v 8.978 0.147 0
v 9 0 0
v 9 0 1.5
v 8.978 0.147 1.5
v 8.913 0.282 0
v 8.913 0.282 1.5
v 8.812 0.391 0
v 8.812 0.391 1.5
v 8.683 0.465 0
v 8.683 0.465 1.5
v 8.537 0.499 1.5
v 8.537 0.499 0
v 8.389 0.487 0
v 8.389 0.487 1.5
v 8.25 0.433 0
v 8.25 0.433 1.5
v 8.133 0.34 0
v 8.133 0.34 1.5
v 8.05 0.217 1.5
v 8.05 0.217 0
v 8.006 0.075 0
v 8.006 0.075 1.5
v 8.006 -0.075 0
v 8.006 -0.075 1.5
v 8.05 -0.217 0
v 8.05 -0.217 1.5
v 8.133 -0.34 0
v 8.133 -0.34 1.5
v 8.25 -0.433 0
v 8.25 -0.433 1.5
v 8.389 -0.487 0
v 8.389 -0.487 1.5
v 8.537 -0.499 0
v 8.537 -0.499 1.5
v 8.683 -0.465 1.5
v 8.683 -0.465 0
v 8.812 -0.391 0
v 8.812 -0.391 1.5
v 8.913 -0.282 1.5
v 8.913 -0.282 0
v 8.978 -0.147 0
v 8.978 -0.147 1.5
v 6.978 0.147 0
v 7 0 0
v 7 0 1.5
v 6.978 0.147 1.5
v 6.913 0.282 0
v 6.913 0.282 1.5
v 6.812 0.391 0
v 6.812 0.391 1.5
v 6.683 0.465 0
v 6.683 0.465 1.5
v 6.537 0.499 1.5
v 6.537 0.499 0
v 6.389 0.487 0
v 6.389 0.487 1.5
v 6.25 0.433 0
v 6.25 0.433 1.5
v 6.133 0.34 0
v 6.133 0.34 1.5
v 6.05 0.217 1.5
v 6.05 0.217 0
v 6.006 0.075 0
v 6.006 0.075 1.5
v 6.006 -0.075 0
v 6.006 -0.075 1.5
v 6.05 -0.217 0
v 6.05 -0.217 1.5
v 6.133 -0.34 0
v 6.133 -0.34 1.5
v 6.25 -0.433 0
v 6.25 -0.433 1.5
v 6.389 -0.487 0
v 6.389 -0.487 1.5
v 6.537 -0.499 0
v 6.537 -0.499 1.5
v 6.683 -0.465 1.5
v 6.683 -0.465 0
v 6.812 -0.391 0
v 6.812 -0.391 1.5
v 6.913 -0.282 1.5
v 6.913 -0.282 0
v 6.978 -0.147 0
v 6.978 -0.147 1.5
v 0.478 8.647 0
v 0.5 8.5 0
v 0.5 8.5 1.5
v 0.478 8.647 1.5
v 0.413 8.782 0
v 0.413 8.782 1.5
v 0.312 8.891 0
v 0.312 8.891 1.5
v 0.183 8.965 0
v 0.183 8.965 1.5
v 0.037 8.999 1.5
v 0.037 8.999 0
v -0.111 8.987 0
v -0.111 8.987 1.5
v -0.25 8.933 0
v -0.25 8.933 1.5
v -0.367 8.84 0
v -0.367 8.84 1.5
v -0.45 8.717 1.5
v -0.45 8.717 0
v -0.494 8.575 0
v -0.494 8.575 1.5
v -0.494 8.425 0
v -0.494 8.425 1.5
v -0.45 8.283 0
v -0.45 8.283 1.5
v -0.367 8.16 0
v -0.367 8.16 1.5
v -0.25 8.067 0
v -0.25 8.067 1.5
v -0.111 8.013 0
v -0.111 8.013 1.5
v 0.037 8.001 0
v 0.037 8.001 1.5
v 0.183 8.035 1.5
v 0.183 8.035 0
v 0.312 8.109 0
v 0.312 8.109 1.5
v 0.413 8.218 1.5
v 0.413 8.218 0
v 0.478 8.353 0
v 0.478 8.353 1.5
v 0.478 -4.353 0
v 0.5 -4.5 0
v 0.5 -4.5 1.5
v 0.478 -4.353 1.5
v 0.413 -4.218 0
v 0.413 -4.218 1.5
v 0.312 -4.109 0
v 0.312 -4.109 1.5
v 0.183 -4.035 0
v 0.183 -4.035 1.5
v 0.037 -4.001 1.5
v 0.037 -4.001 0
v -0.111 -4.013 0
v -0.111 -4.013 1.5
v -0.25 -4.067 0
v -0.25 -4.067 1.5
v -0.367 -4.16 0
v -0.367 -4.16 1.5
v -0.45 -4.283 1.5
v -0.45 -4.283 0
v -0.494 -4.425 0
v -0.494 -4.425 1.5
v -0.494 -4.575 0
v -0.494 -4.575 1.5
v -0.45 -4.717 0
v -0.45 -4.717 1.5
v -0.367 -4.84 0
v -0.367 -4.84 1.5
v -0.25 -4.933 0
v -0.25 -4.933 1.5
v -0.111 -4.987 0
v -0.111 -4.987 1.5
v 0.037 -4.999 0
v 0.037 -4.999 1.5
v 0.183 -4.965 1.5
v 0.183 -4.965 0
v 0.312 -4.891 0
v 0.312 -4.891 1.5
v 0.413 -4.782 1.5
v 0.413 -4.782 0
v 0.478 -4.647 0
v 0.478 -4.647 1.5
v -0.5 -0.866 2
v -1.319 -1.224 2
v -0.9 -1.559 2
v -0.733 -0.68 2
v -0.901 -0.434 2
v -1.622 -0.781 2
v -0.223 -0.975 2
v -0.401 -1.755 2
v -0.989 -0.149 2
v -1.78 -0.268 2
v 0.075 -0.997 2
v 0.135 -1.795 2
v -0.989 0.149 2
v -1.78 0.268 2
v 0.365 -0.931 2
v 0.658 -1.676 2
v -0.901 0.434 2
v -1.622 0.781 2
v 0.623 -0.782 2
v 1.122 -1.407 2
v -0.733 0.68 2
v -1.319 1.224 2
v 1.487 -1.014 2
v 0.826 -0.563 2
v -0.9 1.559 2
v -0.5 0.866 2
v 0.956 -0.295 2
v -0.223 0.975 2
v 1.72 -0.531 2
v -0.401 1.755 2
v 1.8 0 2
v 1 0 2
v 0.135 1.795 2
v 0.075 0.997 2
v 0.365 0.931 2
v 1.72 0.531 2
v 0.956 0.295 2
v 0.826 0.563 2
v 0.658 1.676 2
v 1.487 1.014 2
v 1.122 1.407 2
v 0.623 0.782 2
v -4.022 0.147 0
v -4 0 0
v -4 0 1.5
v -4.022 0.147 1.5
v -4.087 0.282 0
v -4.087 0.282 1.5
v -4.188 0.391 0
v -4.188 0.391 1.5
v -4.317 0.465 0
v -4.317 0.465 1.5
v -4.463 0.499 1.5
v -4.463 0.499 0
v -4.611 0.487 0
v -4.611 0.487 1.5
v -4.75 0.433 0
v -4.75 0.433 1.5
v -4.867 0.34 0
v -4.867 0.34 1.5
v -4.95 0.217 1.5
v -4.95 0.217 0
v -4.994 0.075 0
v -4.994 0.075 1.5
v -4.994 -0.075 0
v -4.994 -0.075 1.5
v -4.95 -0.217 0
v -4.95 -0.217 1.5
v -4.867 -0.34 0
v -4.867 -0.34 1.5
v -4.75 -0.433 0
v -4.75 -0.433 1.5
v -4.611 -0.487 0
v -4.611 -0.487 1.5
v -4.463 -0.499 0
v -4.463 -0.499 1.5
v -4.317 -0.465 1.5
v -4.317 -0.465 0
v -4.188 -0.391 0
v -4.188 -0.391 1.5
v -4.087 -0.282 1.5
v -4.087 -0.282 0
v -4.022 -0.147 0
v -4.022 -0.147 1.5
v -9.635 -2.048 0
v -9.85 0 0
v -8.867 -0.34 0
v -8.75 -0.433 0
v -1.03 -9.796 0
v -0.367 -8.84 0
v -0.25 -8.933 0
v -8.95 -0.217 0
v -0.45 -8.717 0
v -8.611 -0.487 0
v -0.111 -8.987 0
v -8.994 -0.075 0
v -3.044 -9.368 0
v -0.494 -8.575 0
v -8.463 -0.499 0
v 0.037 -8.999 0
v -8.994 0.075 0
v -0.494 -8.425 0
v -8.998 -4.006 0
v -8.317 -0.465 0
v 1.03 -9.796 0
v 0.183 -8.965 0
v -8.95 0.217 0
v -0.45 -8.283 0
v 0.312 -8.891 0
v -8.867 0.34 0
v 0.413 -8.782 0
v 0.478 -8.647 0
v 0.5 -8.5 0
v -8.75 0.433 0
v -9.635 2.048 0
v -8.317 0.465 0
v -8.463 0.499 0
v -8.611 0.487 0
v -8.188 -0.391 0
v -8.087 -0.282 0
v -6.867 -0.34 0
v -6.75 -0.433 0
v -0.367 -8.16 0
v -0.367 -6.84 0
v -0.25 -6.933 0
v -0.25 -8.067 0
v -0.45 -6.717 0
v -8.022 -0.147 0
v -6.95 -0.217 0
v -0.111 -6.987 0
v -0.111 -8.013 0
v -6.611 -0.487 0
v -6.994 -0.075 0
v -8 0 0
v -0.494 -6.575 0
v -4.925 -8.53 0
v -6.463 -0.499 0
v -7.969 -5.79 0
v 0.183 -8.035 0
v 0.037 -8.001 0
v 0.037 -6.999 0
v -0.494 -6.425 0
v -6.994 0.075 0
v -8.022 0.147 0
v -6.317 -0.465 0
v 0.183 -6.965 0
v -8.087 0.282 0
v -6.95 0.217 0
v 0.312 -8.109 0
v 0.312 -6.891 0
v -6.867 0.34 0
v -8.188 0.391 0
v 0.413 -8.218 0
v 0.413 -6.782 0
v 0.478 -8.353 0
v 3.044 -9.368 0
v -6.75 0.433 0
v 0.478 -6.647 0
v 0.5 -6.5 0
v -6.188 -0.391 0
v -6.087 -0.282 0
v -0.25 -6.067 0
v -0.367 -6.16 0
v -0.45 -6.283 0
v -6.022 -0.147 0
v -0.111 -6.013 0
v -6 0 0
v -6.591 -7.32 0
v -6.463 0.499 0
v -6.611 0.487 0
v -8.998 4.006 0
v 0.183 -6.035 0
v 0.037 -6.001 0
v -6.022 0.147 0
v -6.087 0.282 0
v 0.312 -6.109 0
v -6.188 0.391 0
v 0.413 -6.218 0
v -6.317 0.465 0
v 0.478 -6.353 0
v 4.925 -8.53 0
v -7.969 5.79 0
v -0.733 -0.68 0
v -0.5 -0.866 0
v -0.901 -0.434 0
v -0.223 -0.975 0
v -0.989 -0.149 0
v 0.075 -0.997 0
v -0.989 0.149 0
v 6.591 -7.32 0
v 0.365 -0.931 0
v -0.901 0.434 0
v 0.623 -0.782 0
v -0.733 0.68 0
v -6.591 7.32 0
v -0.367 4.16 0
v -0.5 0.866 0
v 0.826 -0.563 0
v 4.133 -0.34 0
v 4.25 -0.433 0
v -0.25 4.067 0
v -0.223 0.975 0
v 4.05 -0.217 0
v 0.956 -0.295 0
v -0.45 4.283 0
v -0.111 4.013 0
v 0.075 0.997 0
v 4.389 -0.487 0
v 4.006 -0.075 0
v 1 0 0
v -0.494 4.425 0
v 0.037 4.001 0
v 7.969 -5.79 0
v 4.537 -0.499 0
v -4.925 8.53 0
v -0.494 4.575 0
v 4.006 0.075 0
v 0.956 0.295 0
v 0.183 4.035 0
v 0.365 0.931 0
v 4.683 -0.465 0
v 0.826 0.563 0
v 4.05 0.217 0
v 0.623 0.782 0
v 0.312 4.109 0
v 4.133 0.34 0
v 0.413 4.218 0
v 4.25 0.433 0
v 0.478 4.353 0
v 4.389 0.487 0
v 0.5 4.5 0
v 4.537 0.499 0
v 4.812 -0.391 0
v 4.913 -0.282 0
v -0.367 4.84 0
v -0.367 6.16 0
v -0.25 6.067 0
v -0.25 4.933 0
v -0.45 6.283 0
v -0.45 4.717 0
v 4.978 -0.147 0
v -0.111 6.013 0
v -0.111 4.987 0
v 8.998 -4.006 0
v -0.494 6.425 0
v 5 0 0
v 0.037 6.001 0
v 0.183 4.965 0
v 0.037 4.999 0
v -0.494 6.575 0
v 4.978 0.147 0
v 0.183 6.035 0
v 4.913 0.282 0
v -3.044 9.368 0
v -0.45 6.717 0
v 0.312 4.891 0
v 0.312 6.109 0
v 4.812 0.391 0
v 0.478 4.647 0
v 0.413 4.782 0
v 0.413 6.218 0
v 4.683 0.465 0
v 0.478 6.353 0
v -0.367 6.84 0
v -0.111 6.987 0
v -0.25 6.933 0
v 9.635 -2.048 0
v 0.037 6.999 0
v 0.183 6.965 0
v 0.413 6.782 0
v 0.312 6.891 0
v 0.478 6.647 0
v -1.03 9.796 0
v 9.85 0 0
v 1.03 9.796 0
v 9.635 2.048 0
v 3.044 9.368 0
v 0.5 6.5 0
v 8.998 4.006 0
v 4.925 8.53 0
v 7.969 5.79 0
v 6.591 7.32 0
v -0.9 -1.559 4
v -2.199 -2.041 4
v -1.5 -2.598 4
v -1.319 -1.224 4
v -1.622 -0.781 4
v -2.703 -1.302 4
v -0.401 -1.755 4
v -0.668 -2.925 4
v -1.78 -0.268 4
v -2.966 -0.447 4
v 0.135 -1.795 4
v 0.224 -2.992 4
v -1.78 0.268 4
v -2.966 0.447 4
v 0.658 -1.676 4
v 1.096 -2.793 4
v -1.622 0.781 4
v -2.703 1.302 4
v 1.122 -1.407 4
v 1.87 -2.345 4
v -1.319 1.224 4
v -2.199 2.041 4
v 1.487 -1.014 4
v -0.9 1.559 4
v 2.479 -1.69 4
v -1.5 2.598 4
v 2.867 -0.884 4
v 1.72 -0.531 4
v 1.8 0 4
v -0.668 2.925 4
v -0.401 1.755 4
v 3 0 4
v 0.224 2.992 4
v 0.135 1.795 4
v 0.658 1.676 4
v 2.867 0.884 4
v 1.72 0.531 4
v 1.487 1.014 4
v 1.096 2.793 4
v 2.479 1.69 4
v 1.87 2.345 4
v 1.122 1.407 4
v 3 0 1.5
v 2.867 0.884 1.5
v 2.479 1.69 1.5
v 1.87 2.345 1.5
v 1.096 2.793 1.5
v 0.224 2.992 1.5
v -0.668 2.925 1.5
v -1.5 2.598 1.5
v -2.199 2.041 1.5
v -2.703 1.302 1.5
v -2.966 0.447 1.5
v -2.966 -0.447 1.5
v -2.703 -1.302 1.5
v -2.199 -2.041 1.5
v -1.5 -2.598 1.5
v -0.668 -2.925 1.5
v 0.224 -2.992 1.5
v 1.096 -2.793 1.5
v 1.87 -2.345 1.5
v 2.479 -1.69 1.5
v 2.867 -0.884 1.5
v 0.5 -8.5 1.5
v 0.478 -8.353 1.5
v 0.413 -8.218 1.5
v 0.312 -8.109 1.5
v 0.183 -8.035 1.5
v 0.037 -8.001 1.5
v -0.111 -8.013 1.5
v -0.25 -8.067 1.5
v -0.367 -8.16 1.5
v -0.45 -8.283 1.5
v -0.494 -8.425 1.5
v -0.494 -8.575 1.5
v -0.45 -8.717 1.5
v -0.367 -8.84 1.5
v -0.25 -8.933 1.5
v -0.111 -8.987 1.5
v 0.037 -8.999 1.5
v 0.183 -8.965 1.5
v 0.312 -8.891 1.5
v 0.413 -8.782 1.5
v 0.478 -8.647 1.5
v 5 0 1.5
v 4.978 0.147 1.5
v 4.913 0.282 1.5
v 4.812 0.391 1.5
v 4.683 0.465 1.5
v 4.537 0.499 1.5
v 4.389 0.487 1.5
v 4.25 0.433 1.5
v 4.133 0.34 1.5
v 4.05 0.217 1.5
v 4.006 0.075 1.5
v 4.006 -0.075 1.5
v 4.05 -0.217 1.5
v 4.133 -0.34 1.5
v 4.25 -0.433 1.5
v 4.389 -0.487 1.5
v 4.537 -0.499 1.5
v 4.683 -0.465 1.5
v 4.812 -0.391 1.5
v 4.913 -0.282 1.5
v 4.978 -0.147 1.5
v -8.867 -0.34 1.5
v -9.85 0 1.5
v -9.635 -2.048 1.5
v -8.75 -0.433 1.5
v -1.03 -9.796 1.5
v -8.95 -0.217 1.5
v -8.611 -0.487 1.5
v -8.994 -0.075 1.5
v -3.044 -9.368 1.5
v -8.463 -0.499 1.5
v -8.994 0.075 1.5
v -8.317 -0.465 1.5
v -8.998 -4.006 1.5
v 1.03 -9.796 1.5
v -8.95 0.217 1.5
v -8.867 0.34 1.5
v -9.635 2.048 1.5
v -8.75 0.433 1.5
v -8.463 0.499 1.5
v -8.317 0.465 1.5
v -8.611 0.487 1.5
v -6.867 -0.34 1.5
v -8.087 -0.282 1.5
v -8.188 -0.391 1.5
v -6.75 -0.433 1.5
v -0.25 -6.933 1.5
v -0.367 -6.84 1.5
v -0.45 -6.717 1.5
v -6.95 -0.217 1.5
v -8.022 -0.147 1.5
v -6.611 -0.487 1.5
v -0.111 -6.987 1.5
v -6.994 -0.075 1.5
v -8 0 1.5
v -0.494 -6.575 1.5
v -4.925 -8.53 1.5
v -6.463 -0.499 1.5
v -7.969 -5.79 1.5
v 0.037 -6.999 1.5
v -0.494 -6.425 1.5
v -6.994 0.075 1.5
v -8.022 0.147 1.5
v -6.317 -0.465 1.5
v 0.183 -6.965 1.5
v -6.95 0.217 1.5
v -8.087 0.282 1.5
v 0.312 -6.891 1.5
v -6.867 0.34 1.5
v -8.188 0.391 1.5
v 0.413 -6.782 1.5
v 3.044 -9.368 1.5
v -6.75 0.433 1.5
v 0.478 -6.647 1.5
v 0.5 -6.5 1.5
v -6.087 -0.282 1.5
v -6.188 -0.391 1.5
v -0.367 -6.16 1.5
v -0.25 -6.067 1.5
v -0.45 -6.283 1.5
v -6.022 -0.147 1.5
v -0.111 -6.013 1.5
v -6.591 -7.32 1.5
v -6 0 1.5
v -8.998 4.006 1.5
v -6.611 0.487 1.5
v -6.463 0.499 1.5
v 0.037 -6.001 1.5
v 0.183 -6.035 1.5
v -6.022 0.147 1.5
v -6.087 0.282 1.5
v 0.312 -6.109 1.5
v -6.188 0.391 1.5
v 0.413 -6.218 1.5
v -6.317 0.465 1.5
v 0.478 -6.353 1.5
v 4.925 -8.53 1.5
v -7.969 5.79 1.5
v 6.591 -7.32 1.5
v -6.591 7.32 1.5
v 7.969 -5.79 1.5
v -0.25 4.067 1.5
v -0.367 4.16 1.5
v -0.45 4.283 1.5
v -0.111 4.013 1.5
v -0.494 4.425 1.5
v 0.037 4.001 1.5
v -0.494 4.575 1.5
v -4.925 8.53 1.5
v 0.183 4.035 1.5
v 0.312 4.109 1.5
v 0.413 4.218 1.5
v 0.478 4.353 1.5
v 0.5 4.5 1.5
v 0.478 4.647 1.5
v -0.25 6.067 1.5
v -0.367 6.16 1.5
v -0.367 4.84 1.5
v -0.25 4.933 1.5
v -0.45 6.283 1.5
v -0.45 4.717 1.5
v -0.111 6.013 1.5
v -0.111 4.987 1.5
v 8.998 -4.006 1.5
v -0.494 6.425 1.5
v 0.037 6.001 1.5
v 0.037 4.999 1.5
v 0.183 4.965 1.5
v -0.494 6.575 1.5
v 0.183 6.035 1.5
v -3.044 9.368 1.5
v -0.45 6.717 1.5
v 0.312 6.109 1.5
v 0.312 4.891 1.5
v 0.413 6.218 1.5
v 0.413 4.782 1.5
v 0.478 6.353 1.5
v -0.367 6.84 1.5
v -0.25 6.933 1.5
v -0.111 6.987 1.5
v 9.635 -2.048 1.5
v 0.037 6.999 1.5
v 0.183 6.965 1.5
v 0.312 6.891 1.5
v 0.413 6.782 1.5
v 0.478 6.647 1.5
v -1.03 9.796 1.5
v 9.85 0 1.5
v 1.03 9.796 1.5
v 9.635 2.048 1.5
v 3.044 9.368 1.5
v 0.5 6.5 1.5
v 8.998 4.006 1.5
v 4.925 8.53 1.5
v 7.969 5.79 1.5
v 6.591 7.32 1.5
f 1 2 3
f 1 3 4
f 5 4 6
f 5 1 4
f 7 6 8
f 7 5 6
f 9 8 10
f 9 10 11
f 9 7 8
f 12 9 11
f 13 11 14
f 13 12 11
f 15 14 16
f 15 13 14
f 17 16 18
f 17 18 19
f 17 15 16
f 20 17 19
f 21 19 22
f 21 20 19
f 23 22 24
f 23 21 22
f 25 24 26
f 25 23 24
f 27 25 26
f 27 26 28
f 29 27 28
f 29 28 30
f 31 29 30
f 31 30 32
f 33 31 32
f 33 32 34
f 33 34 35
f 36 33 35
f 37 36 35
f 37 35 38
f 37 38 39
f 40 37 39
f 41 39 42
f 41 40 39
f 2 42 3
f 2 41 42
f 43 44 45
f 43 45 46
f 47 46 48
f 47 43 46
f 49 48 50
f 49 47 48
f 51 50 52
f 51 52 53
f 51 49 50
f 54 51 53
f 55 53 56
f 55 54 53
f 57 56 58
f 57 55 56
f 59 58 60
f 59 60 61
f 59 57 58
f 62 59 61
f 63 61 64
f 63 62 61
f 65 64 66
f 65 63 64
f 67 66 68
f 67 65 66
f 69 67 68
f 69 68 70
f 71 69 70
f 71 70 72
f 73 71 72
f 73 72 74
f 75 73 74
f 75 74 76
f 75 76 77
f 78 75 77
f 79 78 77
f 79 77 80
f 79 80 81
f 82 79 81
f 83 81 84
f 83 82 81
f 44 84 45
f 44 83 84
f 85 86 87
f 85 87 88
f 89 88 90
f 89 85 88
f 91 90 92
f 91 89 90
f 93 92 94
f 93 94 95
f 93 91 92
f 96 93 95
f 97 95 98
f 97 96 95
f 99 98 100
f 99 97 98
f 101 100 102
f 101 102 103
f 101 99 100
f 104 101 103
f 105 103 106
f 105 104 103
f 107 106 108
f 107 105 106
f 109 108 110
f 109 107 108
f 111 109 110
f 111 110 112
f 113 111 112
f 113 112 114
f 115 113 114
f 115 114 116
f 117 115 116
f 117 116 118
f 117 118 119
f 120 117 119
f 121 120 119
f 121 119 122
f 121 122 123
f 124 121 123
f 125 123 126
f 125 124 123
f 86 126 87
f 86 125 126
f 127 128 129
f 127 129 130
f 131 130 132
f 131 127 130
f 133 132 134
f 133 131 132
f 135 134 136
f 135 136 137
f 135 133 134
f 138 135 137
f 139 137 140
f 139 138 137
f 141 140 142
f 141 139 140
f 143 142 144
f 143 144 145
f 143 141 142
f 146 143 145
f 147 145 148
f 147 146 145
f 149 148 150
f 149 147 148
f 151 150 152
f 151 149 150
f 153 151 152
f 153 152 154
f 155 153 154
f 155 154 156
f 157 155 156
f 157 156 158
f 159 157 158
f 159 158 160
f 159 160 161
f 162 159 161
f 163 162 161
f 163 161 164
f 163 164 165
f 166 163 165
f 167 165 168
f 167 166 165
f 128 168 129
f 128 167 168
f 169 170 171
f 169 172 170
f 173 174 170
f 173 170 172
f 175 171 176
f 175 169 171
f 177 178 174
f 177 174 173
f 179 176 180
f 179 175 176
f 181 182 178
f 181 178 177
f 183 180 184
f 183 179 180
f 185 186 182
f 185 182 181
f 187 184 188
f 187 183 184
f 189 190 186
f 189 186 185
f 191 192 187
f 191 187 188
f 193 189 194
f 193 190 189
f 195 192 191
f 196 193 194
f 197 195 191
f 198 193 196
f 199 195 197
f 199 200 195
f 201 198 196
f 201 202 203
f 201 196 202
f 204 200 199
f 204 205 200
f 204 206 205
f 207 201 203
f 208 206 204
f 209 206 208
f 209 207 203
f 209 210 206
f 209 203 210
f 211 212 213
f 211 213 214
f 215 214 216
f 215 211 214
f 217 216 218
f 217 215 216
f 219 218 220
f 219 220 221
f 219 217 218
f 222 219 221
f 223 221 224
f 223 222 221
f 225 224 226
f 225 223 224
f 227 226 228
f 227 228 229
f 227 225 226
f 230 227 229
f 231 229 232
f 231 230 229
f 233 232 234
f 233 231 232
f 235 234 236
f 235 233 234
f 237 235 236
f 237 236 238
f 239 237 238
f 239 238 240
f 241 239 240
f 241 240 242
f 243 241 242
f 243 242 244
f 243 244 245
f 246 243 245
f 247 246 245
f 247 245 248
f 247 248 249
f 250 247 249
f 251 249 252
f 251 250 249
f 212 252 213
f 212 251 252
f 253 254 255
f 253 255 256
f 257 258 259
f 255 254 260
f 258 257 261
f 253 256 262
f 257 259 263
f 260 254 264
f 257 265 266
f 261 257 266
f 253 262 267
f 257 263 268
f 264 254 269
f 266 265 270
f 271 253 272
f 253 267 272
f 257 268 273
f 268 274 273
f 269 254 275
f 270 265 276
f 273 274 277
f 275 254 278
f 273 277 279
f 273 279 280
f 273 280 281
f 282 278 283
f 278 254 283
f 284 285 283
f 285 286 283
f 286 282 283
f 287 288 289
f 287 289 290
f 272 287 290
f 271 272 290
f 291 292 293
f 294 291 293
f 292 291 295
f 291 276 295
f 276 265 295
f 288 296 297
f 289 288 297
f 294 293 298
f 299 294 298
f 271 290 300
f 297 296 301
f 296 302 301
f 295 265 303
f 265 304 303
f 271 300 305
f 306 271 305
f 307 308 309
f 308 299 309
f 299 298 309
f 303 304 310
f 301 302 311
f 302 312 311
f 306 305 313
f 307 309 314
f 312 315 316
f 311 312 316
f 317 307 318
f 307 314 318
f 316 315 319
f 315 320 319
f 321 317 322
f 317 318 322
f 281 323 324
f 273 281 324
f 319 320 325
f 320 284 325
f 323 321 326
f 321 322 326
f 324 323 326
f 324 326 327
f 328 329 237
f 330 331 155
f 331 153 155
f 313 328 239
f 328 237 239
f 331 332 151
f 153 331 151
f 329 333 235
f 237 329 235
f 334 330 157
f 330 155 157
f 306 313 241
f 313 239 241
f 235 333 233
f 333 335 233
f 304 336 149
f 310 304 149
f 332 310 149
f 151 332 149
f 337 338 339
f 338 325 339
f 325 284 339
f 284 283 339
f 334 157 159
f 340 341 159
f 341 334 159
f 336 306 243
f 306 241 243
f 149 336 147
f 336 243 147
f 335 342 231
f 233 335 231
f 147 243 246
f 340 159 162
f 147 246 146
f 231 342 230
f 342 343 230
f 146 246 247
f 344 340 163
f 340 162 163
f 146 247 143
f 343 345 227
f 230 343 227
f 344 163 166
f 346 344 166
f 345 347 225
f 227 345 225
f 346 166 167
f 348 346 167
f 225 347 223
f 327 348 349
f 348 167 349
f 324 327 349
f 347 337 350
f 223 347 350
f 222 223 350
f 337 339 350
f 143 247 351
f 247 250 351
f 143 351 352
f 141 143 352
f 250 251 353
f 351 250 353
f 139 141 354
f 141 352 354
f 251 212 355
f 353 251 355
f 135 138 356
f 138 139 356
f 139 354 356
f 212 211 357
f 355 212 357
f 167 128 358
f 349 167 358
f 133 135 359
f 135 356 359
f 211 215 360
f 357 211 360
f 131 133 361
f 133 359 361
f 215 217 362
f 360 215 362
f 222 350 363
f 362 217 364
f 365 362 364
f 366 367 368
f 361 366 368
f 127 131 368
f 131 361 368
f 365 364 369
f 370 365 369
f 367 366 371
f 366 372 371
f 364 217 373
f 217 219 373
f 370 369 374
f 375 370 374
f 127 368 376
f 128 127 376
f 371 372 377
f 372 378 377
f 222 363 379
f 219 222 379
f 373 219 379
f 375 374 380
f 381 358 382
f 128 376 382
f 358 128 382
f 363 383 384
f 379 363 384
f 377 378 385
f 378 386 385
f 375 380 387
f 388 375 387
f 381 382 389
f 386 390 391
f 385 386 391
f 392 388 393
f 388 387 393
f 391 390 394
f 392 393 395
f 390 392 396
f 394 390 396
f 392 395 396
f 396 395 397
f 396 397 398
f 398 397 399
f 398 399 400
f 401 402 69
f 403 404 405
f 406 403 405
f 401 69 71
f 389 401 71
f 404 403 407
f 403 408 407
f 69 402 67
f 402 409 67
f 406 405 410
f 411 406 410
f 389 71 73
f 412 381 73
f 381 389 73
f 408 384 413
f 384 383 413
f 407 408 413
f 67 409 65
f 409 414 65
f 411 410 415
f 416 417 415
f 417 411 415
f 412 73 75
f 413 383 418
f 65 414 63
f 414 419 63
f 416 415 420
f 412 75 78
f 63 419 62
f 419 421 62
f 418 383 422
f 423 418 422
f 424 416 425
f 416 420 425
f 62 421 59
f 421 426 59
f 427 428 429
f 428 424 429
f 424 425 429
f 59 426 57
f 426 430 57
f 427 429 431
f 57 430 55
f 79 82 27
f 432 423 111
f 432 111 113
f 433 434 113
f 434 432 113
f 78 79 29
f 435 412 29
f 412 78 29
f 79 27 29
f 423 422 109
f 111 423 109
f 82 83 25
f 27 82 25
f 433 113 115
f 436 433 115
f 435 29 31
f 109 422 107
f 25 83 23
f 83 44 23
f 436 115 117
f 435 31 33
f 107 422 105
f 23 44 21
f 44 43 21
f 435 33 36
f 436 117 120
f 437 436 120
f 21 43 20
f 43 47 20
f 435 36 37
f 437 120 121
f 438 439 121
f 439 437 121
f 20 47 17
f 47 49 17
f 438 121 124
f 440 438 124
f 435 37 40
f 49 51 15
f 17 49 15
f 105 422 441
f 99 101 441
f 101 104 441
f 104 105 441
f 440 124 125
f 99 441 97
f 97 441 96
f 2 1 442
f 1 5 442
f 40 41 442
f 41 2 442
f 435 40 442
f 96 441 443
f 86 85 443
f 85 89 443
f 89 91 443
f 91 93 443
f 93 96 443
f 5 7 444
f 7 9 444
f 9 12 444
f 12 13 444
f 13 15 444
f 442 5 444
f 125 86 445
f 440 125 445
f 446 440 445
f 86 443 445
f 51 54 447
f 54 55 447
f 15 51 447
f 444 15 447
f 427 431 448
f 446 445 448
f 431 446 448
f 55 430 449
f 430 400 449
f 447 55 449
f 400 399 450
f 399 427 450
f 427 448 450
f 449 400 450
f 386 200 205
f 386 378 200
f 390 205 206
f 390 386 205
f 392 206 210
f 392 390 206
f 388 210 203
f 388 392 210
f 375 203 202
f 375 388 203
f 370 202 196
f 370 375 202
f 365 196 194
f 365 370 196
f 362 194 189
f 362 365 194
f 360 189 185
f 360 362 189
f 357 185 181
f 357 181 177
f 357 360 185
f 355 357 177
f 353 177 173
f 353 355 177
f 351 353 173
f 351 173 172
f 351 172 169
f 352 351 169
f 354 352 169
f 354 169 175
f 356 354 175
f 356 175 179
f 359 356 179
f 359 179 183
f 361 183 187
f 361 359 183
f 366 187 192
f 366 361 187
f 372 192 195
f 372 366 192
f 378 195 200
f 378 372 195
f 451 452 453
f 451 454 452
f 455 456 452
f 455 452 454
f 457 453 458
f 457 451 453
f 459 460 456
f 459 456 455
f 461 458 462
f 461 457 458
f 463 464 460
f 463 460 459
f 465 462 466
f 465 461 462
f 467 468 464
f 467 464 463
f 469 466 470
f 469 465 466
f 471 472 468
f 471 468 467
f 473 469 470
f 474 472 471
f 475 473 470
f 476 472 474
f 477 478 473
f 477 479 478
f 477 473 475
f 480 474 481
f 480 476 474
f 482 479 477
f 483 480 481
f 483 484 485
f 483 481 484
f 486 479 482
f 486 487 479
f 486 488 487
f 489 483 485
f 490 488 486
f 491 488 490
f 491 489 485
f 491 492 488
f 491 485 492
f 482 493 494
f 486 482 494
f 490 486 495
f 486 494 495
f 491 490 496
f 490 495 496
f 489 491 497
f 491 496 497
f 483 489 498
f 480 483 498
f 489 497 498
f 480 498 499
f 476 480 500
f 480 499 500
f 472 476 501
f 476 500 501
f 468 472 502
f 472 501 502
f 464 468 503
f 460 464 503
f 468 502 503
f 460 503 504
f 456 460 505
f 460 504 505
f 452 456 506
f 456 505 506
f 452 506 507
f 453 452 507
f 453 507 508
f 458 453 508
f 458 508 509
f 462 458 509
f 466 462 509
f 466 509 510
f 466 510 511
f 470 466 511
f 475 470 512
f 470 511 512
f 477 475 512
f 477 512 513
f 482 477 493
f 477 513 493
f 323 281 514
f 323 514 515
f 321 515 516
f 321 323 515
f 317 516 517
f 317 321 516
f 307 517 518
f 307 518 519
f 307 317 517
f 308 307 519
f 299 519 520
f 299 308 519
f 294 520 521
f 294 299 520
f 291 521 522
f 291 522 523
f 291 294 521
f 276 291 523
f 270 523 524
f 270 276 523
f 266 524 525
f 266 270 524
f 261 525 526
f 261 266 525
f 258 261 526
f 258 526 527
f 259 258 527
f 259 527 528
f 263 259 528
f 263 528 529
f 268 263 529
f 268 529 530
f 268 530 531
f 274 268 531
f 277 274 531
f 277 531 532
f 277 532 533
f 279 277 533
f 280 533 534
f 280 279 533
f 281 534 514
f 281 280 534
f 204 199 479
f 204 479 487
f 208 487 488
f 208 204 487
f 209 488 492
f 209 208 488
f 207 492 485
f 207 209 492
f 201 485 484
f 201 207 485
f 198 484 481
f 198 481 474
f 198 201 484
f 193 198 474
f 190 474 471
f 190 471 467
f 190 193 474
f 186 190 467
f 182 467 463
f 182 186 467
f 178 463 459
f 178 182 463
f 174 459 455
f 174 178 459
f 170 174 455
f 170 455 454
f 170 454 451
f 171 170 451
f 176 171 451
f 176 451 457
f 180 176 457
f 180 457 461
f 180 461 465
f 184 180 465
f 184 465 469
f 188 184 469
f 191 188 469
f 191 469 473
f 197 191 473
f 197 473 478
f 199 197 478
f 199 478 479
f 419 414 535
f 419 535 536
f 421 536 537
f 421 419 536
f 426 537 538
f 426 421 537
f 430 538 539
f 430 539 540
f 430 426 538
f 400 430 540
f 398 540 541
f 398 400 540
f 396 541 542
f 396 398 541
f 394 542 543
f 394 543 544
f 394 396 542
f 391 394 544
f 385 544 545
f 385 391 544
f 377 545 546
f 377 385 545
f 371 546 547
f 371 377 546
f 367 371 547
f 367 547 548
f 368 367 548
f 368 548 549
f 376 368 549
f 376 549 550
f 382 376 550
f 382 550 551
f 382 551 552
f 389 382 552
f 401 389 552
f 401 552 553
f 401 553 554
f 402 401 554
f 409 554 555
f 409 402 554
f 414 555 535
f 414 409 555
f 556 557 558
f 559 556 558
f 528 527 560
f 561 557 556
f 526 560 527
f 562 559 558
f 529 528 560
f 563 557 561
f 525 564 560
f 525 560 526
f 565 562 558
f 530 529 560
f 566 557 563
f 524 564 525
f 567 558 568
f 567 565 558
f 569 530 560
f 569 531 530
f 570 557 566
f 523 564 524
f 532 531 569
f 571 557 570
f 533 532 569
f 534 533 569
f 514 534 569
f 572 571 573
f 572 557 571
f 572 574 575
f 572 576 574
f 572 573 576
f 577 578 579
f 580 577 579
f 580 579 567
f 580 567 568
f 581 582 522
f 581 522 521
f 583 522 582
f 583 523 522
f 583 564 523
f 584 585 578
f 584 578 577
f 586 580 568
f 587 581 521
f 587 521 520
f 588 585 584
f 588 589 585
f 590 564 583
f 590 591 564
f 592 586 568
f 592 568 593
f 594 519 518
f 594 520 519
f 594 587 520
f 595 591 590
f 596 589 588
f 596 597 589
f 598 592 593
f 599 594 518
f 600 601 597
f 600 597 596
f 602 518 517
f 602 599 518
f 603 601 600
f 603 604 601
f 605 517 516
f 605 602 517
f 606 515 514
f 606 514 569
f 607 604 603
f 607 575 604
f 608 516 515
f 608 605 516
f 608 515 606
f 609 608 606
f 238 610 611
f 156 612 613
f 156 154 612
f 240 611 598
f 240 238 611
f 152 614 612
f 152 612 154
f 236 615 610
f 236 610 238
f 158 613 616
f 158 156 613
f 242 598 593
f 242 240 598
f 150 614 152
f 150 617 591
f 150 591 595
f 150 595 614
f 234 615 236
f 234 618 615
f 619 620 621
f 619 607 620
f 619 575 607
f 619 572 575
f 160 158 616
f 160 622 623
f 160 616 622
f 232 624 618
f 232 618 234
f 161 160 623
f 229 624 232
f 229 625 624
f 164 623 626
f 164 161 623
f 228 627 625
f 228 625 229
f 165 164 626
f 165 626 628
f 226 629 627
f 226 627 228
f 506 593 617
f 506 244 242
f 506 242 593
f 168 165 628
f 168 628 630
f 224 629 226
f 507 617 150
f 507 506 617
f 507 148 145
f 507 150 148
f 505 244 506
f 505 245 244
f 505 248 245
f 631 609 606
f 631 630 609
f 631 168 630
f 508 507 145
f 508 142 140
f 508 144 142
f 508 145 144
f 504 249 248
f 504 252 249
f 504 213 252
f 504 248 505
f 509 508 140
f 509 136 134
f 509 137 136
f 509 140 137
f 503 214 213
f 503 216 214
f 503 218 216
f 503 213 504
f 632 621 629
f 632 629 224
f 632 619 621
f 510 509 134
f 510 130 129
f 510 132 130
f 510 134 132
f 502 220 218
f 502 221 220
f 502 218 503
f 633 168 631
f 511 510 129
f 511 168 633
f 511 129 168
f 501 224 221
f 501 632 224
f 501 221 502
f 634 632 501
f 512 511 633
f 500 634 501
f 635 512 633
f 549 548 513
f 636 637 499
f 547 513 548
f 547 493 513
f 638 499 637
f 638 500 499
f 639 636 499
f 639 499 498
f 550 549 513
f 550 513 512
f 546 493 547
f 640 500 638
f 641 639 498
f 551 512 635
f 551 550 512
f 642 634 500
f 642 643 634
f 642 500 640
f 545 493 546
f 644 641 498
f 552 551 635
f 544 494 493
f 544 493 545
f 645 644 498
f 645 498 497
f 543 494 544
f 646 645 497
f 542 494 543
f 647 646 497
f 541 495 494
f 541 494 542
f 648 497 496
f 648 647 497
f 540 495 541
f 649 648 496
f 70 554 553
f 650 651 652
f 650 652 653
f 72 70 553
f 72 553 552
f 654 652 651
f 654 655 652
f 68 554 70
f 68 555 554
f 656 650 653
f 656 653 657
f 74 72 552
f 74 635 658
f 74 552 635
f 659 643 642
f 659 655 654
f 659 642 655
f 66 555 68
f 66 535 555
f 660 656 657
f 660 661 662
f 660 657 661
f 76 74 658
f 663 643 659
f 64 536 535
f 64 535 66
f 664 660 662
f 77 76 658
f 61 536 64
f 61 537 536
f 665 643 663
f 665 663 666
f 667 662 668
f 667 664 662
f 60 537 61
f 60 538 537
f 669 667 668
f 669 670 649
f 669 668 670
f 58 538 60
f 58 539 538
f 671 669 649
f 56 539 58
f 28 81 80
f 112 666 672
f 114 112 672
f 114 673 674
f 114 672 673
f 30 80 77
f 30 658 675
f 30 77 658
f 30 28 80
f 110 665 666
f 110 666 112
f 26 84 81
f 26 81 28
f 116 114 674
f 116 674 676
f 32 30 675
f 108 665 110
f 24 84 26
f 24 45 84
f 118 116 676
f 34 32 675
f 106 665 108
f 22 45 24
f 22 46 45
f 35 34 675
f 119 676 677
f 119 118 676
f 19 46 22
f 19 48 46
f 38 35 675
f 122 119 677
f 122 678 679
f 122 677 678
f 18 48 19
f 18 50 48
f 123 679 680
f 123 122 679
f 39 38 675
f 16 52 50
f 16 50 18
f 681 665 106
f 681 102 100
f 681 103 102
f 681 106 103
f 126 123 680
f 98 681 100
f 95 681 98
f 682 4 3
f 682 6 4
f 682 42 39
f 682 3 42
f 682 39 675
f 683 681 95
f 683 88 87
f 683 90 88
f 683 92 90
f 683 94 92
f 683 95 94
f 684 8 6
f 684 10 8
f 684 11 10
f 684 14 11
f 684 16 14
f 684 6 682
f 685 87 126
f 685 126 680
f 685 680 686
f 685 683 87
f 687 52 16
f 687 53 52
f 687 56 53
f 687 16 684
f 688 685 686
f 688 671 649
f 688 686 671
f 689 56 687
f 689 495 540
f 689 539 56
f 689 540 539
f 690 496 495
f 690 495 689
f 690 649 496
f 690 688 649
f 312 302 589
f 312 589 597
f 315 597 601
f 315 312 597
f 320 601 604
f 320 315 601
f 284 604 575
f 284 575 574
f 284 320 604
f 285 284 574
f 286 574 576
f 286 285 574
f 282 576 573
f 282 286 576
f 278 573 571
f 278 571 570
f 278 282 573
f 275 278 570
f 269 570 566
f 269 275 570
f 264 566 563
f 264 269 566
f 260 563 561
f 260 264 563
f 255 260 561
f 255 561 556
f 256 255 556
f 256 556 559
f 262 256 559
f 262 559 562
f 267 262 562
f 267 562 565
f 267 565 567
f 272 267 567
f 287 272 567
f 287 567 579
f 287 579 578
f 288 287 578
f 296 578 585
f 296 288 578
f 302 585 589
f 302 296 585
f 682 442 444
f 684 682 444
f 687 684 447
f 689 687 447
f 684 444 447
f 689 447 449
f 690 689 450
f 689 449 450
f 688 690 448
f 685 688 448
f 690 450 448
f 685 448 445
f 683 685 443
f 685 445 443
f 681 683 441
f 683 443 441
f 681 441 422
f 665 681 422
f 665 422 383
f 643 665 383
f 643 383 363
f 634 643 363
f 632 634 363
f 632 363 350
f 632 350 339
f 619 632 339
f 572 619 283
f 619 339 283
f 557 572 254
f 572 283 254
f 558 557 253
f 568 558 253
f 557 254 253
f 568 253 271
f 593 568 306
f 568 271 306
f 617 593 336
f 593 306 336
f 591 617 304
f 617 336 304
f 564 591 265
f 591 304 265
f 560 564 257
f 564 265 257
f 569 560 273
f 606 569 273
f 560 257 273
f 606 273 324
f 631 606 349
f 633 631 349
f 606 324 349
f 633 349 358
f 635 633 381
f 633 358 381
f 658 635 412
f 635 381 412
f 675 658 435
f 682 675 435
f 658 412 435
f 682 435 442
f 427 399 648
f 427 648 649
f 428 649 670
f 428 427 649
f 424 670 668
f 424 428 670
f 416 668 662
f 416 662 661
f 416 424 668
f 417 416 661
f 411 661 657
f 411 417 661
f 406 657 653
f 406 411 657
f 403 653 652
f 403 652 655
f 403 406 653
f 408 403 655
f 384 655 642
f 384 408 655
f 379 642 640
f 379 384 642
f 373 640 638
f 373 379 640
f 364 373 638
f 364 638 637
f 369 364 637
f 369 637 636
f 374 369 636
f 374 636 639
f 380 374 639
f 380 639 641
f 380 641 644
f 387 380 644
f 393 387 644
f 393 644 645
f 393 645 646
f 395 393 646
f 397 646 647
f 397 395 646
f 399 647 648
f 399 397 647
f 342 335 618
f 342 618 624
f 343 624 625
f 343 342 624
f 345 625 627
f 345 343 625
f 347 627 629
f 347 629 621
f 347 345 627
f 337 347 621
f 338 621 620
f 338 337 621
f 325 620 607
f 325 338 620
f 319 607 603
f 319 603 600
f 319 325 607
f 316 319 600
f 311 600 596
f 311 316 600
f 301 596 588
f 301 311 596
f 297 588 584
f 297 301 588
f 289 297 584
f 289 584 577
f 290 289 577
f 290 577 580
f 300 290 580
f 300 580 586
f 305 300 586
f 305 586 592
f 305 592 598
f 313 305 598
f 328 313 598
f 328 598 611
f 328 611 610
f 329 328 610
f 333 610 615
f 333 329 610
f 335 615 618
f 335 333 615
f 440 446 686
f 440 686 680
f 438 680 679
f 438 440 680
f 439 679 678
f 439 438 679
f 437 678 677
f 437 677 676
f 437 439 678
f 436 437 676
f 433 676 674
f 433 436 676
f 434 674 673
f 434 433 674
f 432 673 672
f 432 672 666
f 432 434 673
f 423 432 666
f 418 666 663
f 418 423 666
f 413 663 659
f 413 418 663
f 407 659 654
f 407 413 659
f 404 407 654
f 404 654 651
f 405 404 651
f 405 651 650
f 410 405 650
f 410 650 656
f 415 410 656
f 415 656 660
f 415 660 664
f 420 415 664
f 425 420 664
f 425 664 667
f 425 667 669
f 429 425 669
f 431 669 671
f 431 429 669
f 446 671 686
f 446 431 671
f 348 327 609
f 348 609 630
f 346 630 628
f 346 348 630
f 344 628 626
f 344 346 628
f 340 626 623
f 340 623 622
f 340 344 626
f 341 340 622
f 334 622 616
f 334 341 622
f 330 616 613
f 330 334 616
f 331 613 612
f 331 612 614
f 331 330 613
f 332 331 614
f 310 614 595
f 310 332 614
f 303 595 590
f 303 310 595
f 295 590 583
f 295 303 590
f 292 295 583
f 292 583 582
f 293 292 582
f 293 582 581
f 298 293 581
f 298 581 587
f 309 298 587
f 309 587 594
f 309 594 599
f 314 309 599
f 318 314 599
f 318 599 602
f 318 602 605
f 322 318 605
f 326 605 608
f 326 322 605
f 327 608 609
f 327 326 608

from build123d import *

# Parameters (mm, degrees)
F0_R     = 9.85
F0_R_2   = 0.5
F0_R_3   = 1
F1_DEPTH = 1.5
F2_R     = 3
F2_R_2   = 1.8
F3_DEPTH = 2.5
F4_R     = 1.8
F4_R_2   = 1
F5_DEPTH = 0.5


with BuildPart() as f1:
    # F0 (on Top) → F1 (new body)
    with BuildSketch(Plane.XY):
        Circle(F0_R)
        with Locations((0, -8.5)):
            Circle(F0_R_2, mode=Mode.SUBTRACT)
        with Locations((0, -6.5)):
            Circle(F0_R_2, mode=Mode.SUBTRACT)
        with Locations((0, -4.5)):
            Circle(F0_R_2, mode=Mode.SUBTRACT)
        with Locations((-8.5, 0)):
            Circle(F0_R_2, mode=Mode.SUBTRACT)
        with Locations((-6.5, 0)):
            Circle(F0_R_2, mode=Mode.SUBTRACT)
        with Locations((-4.5, 0)):
            Circle(F0_R_2, mode=Mode.SUBTRACT)
        Circle(F0_R_3, mode=Mode.SUBTRACT)
        with Locations((4.5, 0)):
            Circle(F0_R_2, mode=Mode.SUBTRACT)
        with Locations((0, 4.5)):
            Circle(F0_R_2, mode=Mode.SUBTRACT)
        with Locations((6.5, 0)):
            Circle(F0_R_2, mode=Mode.SUBTRACT)
        with Locations((8.5, 0)):
            Circle(F0_R_2, mode=Mode.SUBTRACT)
        with Locations((0, 6.5)):
            Circle(F0_R_2, mode=Mode.SUBTRACT)
        with Locations((0, 8.5)):
            Circle(F0_R_2, mode=Mode.SUBTRACT)
    extrude(amount=F1_DEPTH)

    # F2 (on face) → F3 (join)
    with BuildSketch(Plane.XY.offset(1.5)):
        Circle(F2_R)
        Circle(F2_R_2, mode=Mode.SUBTRACT)
    extrude(amount=F3_DEPTH)

    # F4 (on face) → F5 (join)
    with BuildSketch(Plane.XY.offset(1.5)):
        Circle(F4_R)
        Circle(F4_R_2, mode=Mode.SUBTRACT)
    extrude(amount=F5_DEPTH)


solid = f1.part
